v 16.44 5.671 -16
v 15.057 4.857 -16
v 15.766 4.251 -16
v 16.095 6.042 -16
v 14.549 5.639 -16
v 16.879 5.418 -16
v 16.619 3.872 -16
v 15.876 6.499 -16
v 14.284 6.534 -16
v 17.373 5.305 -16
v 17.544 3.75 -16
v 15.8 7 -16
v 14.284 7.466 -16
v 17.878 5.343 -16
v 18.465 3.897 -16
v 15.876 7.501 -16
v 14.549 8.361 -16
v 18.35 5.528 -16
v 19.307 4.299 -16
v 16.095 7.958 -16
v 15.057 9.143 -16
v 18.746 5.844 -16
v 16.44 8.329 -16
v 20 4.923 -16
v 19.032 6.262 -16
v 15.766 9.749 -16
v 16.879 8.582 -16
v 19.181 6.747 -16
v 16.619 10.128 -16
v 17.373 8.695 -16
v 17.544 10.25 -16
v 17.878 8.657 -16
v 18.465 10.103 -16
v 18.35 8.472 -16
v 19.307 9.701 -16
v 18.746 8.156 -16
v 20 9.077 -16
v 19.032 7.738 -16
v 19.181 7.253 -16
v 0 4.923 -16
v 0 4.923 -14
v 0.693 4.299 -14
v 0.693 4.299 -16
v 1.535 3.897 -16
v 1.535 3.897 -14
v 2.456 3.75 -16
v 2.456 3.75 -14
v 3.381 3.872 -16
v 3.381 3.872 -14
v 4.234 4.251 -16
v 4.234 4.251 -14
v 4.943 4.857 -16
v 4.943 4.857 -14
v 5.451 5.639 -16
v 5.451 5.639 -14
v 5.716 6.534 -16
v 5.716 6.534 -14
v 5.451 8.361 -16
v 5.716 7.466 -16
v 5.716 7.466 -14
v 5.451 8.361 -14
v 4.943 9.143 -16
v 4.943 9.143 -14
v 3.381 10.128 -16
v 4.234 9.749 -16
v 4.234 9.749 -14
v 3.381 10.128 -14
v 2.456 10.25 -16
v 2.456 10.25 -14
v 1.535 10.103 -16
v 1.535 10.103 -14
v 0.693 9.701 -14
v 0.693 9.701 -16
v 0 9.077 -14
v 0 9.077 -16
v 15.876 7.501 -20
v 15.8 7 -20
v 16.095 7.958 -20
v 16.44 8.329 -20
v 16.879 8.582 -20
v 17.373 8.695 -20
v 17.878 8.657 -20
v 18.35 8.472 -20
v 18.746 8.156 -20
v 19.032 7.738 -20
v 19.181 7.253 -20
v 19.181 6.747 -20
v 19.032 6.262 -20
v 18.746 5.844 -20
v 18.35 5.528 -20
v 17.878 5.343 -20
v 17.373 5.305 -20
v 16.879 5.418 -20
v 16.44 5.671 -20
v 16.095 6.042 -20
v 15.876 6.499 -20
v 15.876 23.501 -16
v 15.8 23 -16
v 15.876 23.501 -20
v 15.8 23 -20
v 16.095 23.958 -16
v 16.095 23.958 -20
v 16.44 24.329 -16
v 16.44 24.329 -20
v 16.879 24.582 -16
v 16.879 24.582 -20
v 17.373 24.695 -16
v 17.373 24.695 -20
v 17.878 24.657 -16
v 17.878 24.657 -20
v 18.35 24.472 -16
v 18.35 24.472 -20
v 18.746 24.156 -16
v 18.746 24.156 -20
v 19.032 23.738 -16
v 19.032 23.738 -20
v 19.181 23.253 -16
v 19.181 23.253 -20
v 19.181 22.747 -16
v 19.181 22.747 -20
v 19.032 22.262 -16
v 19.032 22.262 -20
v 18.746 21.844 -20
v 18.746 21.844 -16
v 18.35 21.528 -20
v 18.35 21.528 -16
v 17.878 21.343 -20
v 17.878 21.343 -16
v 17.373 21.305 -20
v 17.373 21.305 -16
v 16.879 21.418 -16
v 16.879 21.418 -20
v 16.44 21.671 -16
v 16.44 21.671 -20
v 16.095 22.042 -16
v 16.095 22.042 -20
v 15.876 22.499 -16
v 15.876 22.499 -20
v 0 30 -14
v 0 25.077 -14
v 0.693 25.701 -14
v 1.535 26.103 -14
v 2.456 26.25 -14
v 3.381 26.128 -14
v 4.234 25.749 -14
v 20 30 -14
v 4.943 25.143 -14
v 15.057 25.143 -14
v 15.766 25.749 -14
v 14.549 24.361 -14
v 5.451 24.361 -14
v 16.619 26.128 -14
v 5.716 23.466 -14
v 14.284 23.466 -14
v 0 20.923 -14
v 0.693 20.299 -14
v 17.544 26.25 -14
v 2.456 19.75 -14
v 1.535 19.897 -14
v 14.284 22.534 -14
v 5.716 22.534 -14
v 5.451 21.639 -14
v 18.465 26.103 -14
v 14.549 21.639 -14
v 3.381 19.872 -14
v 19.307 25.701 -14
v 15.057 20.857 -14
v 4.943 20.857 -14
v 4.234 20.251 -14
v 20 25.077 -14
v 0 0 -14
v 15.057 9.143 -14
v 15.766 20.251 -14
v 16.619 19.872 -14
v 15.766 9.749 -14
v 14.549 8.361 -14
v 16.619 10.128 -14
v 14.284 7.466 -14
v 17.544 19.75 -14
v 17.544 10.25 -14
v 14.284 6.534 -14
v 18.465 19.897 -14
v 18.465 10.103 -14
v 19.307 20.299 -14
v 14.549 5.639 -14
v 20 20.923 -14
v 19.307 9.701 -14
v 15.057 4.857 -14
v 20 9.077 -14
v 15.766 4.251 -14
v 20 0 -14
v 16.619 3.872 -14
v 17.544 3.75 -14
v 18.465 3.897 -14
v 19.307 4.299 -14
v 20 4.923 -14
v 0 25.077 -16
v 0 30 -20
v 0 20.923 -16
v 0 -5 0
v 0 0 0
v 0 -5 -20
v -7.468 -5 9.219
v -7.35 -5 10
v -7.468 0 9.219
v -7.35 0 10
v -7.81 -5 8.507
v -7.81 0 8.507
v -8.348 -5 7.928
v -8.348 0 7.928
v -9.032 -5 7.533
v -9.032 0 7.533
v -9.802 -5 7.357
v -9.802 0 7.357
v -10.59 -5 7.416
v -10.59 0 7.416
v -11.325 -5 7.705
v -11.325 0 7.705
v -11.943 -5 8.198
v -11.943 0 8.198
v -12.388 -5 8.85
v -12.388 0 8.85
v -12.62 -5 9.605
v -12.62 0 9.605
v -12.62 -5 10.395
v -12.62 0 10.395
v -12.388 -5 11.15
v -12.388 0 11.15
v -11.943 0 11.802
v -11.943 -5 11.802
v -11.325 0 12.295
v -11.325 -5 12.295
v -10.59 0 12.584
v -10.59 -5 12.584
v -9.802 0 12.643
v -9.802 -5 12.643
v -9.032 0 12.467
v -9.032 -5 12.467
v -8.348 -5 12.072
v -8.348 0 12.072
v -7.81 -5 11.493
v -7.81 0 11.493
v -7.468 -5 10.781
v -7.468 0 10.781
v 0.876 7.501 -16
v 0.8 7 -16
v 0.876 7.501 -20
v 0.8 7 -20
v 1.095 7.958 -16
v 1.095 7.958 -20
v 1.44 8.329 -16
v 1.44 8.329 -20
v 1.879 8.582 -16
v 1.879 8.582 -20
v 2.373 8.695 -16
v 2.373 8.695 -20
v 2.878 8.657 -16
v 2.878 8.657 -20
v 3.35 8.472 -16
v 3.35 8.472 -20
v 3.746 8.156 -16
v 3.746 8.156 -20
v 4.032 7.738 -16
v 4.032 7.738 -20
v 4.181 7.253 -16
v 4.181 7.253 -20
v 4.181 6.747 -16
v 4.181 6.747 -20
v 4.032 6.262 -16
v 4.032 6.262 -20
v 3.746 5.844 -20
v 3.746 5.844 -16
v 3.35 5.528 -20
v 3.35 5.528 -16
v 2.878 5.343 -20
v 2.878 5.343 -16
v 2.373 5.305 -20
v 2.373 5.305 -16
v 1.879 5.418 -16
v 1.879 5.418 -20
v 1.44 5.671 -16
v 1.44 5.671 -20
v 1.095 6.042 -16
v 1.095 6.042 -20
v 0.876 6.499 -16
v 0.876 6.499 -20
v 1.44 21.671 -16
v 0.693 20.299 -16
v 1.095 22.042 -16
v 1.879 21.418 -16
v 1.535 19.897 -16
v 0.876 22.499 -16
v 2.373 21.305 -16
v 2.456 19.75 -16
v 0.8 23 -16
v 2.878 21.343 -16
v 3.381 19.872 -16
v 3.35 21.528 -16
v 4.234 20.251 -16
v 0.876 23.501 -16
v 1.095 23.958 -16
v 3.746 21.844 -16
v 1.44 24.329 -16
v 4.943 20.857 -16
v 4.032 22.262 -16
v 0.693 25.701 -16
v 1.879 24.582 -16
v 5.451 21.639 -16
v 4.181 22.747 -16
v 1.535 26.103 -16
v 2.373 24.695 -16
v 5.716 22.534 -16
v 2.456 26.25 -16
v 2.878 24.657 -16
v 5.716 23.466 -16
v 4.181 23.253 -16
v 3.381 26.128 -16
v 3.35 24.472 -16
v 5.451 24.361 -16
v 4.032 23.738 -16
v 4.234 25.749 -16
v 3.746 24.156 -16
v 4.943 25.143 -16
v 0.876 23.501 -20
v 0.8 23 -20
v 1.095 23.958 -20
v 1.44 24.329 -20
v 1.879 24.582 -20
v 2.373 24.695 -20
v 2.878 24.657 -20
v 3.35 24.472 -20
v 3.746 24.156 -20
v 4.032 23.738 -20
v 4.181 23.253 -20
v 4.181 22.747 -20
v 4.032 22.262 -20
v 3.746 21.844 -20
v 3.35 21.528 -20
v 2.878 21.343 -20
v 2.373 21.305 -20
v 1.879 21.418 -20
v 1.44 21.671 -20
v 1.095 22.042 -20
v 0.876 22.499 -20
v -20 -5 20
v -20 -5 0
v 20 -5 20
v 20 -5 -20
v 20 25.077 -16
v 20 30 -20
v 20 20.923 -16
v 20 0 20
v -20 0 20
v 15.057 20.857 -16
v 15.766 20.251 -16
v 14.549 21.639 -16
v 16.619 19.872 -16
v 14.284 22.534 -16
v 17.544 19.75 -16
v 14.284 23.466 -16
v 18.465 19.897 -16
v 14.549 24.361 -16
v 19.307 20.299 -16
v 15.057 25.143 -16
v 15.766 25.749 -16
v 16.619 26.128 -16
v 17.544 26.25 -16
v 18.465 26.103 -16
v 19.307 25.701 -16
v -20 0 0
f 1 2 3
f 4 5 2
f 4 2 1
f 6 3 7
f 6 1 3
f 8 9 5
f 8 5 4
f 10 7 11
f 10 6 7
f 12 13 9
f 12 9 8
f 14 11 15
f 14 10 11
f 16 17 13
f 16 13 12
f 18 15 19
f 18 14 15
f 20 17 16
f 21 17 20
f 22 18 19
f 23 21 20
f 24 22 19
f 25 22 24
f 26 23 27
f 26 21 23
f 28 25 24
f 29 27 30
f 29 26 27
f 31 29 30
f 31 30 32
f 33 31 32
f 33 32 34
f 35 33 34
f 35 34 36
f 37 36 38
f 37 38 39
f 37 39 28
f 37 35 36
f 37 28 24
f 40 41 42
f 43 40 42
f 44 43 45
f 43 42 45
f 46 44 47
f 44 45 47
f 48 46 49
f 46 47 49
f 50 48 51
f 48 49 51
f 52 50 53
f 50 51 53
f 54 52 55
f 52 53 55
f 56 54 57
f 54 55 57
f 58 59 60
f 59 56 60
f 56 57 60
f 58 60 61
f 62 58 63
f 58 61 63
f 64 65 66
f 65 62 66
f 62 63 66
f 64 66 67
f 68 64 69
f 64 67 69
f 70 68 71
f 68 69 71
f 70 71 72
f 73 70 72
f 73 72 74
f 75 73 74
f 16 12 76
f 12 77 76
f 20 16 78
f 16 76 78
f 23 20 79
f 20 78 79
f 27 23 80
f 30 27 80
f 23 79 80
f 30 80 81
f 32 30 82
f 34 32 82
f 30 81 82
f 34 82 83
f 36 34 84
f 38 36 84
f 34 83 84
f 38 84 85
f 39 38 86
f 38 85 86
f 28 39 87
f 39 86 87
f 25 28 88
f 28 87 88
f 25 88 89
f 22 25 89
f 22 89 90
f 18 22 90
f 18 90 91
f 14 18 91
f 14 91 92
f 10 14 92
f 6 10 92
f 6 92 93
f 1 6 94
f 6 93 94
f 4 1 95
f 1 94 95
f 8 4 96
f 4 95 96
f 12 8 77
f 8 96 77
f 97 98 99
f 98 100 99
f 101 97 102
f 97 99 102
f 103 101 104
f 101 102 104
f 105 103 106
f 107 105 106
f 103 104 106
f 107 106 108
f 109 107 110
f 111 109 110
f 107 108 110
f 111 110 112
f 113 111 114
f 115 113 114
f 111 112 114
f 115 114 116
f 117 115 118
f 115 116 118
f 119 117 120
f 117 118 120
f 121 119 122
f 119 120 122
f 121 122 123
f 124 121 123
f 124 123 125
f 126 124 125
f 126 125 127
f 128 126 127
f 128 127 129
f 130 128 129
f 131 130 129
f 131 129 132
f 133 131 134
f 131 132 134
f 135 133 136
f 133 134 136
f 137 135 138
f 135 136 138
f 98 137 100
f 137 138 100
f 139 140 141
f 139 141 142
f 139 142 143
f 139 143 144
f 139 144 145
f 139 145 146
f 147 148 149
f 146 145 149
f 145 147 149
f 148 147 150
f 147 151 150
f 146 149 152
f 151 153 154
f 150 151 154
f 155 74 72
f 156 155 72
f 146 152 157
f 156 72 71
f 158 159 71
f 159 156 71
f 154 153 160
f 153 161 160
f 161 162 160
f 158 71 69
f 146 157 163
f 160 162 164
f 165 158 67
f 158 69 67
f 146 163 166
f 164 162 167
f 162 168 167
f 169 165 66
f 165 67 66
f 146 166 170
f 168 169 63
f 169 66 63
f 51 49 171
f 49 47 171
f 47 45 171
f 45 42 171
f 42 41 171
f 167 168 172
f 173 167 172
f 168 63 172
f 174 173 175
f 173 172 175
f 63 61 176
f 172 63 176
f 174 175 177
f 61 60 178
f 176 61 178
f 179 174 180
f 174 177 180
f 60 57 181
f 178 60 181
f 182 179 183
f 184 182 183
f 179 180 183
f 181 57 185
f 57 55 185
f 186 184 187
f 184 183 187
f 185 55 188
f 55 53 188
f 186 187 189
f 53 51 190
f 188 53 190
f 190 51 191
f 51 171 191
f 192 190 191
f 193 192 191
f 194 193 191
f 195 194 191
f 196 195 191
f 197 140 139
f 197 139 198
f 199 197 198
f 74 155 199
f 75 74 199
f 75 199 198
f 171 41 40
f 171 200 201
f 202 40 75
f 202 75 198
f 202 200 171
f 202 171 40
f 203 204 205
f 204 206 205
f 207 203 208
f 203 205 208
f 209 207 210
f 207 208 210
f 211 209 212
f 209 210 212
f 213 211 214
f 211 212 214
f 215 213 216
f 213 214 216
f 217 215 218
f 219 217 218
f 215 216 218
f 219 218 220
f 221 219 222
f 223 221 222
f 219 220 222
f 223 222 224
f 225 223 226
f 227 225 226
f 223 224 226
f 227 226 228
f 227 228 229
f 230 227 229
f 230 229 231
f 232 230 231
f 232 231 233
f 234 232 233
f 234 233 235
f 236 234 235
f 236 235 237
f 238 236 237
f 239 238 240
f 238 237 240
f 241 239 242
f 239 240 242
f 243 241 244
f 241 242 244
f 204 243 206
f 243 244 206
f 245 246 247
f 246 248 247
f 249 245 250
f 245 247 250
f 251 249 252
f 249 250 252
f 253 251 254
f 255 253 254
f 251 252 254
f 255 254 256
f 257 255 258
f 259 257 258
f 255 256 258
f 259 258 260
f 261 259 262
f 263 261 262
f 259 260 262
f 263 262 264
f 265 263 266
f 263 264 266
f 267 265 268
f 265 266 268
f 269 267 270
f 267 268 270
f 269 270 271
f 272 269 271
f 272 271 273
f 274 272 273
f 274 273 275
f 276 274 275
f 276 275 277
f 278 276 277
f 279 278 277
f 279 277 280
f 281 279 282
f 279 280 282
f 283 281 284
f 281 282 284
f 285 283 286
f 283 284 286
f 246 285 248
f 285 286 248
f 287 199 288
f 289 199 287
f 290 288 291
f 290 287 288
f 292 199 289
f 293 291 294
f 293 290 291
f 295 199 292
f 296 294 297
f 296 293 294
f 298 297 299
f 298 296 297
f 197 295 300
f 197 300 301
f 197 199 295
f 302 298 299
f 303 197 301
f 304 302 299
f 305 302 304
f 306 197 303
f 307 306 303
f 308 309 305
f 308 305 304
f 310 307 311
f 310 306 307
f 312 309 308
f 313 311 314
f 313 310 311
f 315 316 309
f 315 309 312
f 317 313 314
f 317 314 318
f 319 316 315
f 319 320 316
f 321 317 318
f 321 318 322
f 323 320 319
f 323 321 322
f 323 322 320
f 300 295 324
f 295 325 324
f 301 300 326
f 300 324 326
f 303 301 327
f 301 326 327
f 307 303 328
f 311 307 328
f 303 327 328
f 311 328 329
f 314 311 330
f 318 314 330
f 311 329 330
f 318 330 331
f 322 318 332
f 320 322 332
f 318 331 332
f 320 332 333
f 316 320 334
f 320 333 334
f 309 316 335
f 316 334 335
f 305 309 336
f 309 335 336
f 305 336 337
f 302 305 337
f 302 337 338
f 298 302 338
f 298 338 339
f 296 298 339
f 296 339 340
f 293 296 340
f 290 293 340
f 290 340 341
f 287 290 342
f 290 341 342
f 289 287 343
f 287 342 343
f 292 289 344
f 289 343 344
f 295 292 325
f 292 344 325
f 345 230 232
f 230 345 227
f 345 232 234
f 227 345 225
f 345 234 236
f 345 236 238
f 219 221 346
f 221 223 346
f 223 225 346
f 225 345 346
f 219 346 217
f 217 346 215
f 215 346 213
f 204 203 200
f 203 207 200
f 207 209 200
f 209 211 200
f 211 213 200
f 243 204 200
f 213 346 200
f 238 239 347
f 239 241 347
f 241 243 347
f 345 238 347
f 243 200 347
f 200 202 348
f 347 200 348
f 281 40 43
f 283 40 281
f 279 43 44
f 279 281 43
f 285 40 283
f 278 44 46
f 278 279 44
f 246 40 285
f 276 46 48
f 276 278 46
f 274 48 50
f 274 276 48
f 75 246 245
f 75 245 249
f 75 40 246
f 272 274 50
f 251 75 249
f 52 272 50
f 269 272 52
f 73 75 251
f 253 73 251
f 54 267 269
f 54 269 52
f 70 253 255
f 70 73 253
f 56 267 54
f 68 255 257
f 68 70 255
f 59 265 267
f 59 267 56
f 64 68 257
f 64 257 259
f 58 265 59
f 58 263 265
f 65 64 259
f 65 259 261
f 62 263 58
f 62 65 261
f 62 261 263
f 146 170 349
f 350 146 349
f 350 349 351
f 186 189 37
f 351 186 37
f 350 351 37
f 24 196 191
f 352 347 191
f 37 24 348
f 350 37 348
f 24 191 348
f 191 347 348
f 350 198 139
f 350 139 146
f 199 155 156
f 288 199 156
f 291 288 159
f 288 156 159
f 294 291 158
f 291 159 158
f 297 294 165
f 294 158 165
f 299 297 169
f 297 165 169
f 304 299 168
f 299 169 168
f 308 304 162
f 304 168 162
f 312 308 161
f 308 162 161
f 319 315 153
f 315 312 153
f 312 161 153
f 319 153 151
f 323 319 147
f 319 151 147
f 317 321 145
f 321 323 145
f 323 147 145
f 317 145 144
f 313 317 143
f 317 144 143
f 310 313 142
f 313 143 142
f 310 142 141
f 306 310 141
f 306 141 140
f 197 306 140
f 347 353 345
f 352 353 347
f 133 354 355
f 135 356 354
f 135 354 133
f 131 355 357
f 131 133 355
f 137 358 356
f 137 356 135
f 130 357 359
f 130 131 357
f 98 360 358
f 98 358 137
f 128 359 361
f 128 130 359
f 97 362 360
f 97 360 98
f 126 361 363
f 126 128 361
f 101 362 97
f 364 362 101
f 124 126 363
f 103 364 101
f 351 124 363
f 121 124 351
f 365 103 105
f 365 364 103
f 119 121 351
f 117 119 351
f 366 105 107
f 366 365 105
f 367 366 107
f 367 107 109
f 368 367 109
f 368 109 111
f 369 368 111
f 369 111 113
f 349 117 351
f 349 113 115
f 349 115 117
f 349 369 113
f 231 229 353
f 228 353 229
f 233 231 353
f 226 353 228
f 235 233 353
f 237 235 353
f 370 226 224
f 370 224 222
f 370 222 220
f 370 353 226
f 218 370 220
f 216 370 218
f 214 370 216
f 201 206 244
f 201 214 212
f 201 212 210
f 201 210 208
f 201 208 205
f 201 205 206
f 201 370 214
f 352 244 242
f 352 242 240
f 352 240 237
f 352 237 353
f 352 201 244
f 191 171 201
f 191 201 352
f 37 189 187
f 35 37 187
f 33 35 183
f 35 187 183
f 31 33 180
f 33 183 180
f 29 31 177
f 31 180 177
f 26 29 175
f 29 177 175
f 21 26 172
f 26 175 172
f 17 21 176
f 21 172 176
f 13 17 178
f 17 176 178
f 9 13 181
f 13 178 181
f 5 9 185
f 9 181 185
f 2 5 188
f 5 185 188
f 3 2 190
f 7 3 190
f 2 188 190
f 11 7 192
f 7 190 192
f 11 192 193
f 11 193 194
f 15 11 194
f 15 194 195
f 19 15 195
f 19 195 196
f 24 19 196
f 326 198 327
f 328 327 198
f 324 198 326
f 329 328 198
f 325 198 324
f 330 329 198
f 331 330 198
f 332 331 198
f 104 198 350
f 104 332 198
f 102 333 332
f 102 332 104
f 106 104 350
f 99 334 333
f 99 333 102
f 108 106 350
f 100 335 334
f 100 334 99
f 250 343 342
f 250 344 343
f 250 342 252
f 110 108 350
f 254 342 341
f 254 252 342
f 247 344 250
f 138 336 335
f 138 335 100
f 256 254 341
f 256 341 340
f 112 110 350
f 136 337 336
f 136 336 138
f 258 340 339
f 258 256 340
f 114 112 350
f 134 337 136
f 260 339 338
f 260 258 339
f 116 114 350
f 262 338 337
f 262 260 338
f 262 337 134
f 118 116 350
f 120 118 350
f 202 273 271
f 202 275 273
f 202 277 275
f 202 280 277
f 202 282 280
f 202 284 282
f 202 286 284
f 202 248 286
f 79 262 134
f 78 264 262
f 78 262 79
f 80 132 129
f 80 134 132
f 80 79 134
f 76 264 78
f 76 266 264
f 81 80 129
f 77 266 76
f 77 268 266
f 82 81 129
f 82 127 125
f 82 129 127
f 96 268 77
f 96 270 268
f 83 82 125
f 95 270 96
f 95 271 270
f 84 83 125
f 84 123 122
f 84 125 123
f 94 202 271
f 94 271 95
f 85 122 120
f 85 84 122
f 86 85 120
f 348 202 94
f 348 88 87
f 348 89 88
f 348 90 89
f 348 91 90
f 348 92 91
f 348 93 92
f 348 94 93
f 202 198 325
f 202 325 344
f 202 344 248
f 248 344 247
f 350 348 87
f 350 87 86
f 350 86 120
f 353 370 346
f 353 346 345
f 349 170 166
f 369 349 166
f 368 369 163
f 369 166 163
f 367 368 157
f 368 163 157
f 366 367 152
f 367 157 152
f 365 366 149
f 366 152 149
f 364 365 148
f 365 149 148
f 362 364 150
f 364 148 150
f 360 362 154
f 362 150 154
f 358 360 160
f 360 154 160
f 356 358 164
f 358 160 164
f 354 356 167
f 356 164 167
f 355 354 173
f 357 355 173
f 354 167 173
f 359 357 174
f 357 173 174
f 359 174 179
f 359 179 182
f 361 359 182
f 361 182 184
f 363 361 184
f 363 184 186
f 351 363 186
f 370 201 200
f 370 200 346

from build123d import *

# Parameters (mm, degrees)
BOSS_EXTRUDE1_DEPTH                                  = 5
SKETCH2_W                                            = 20
SKETCH2_H                                            = 6
BOSS_EXTRUDE2_DEPTH                                  = 30
SKETCH3_R                                            = 1.5
CUT_EXTRUDE1_DEPTH                                   = 50.558046773
REFRENTADO_PARA_TORNILLO_CON_CABEZA_PLAN_D           = 3.4
REFRENTADO_PARA_TORNILLO_CON_CABEZA_PLAN_CBORE_D     = 6.5
REFRENTADO_PARA_TORNILLO_CON_CABEZA_PLAN_CBORE_DEPTH = 2
CUT_EXTRUDE2_REACH                                   = 47
SKETCH7_R                                            = 2.5
TALADRO_DE_MARGEN_PARA_M51_D                         = 5.3
TALADRO_DE_MARGEN_PARA_M51_DEPTH                     = 5
TALADRO_DE_MARGEN_PARA_M51_TIP                       = 1.59228064


with BuildPart() as part:
    # Sketch1 → Boss-Extrude1 (new body)
    with BuildSketch(Plane(origin=(0, 0, 0), x_dir=(1, 0, 0), z_dir=(0, 1, 0))):
        Polygon((0, 0), (-20, 0), (-20, -20), (0, -20), (20, -20), (20, 0), (20, 20), (0, 20), align=None)
    extrude(amount=-BOSS_EXTRUDE1_DEPTH)

    # Sketch2 → Boss-Extrude2 (add)
    with BuildSketch(Plane(origin=(0, 0, 0), x_dir=(1, 0, 0), z_dir=(0, 1, 0))):
        with Locations((10, 17)):
            Rectangle(SKETCH2_W, SKETCH2_H)
    extrude(amount=BOSS_EXTRUDE2_DEPTH)

    # Sketch3 → Cut-Extrude1 (cut, through all)
    with BuildSketch(Plane.XY.offset(-14)):
        with Locations((2.5, 7)):
            Circle(SKETCH3_R)
        with Locations(Location((2.5, 23, 0), (0, 0, 180))):
            Circle(SKETCH3_R)
        with Locations(Location((17.5, 7, 0), (0, 0, 180))):
            Circle(SKETCH3_R)
        with Locations((17.5, 23)):
            Circle(SKETCH3_R)
    extrude(amount=-CUT_EXTRUDE1_DEPTH, mode=Mode.SUBTRACT)

    # Refrentado para tornillo con cabeza plana de M31 (through all)
    with Locations(Plane.XY.offset(-14)):
        with Locations((2.5, 23), (2.5, 7), (17.5, 7), (17.5, 23)):
            CounterBoreHole(REFRENTADO_PARA_TORNILLO_CON_CABEZA_PLAN_D / 2, REFRENTADO_PARA_TORNILLO_CON_CABEZA_PLAN_CBORE_D / 2, REFRENTADO_PARA_TORNILLO_CON_CABEZA_PLAN_CBORE_DEPTH)

    # Sketch7 → Cut-Extrude2 (cut, up to next)
    with BuildSketch(Plane.XZ.offset(5), mode=Mode.PRIVATE) as cut_extrude2_sk1:
        with Locations(Location((-10, 10, 0), (0, 0, 270))):
            Circle(SKETCH7_R)
    cut_extrude2_tool1 = extrude(cut_extrude2_sk1.sketch, amount=-CUT_EXTRUDE2_REACH, mode=Mode.PRIVATE) & part.part
    add(cut_extrude2_tool1.solids().sort_by_distance((-10, -5, 10))[0], mode=Mode.SUBTRACT)

    # Taladro de margen para M51
    with Locations(Plane(origin=(0, -5, 0), x_dir=(-1, 0, 0), z_dir=(0, -1, 0))):
        with Locations((10, -10)):
            Hole(TALADRO_DE_MARGEN_PARA_M51_D / 2, depth=TALADRO_DE_MARGEN_PARA_M51_DEPTH)
            with Locations((0, 0, -(TALADRO_DE_MARGEN_PARA_M51_DEPTH + TALADRO_DE_MARGEN_PARA_M51_TIP / 2))):  # 118° drill point
                Cone(0, TALADRO_DE_MARGEN_PARA_M51_D / 2, TALADRO_DE_MARGEN_PARA_M51_TIP, mode=Mode.SUBTRACT)


solid = part.part
